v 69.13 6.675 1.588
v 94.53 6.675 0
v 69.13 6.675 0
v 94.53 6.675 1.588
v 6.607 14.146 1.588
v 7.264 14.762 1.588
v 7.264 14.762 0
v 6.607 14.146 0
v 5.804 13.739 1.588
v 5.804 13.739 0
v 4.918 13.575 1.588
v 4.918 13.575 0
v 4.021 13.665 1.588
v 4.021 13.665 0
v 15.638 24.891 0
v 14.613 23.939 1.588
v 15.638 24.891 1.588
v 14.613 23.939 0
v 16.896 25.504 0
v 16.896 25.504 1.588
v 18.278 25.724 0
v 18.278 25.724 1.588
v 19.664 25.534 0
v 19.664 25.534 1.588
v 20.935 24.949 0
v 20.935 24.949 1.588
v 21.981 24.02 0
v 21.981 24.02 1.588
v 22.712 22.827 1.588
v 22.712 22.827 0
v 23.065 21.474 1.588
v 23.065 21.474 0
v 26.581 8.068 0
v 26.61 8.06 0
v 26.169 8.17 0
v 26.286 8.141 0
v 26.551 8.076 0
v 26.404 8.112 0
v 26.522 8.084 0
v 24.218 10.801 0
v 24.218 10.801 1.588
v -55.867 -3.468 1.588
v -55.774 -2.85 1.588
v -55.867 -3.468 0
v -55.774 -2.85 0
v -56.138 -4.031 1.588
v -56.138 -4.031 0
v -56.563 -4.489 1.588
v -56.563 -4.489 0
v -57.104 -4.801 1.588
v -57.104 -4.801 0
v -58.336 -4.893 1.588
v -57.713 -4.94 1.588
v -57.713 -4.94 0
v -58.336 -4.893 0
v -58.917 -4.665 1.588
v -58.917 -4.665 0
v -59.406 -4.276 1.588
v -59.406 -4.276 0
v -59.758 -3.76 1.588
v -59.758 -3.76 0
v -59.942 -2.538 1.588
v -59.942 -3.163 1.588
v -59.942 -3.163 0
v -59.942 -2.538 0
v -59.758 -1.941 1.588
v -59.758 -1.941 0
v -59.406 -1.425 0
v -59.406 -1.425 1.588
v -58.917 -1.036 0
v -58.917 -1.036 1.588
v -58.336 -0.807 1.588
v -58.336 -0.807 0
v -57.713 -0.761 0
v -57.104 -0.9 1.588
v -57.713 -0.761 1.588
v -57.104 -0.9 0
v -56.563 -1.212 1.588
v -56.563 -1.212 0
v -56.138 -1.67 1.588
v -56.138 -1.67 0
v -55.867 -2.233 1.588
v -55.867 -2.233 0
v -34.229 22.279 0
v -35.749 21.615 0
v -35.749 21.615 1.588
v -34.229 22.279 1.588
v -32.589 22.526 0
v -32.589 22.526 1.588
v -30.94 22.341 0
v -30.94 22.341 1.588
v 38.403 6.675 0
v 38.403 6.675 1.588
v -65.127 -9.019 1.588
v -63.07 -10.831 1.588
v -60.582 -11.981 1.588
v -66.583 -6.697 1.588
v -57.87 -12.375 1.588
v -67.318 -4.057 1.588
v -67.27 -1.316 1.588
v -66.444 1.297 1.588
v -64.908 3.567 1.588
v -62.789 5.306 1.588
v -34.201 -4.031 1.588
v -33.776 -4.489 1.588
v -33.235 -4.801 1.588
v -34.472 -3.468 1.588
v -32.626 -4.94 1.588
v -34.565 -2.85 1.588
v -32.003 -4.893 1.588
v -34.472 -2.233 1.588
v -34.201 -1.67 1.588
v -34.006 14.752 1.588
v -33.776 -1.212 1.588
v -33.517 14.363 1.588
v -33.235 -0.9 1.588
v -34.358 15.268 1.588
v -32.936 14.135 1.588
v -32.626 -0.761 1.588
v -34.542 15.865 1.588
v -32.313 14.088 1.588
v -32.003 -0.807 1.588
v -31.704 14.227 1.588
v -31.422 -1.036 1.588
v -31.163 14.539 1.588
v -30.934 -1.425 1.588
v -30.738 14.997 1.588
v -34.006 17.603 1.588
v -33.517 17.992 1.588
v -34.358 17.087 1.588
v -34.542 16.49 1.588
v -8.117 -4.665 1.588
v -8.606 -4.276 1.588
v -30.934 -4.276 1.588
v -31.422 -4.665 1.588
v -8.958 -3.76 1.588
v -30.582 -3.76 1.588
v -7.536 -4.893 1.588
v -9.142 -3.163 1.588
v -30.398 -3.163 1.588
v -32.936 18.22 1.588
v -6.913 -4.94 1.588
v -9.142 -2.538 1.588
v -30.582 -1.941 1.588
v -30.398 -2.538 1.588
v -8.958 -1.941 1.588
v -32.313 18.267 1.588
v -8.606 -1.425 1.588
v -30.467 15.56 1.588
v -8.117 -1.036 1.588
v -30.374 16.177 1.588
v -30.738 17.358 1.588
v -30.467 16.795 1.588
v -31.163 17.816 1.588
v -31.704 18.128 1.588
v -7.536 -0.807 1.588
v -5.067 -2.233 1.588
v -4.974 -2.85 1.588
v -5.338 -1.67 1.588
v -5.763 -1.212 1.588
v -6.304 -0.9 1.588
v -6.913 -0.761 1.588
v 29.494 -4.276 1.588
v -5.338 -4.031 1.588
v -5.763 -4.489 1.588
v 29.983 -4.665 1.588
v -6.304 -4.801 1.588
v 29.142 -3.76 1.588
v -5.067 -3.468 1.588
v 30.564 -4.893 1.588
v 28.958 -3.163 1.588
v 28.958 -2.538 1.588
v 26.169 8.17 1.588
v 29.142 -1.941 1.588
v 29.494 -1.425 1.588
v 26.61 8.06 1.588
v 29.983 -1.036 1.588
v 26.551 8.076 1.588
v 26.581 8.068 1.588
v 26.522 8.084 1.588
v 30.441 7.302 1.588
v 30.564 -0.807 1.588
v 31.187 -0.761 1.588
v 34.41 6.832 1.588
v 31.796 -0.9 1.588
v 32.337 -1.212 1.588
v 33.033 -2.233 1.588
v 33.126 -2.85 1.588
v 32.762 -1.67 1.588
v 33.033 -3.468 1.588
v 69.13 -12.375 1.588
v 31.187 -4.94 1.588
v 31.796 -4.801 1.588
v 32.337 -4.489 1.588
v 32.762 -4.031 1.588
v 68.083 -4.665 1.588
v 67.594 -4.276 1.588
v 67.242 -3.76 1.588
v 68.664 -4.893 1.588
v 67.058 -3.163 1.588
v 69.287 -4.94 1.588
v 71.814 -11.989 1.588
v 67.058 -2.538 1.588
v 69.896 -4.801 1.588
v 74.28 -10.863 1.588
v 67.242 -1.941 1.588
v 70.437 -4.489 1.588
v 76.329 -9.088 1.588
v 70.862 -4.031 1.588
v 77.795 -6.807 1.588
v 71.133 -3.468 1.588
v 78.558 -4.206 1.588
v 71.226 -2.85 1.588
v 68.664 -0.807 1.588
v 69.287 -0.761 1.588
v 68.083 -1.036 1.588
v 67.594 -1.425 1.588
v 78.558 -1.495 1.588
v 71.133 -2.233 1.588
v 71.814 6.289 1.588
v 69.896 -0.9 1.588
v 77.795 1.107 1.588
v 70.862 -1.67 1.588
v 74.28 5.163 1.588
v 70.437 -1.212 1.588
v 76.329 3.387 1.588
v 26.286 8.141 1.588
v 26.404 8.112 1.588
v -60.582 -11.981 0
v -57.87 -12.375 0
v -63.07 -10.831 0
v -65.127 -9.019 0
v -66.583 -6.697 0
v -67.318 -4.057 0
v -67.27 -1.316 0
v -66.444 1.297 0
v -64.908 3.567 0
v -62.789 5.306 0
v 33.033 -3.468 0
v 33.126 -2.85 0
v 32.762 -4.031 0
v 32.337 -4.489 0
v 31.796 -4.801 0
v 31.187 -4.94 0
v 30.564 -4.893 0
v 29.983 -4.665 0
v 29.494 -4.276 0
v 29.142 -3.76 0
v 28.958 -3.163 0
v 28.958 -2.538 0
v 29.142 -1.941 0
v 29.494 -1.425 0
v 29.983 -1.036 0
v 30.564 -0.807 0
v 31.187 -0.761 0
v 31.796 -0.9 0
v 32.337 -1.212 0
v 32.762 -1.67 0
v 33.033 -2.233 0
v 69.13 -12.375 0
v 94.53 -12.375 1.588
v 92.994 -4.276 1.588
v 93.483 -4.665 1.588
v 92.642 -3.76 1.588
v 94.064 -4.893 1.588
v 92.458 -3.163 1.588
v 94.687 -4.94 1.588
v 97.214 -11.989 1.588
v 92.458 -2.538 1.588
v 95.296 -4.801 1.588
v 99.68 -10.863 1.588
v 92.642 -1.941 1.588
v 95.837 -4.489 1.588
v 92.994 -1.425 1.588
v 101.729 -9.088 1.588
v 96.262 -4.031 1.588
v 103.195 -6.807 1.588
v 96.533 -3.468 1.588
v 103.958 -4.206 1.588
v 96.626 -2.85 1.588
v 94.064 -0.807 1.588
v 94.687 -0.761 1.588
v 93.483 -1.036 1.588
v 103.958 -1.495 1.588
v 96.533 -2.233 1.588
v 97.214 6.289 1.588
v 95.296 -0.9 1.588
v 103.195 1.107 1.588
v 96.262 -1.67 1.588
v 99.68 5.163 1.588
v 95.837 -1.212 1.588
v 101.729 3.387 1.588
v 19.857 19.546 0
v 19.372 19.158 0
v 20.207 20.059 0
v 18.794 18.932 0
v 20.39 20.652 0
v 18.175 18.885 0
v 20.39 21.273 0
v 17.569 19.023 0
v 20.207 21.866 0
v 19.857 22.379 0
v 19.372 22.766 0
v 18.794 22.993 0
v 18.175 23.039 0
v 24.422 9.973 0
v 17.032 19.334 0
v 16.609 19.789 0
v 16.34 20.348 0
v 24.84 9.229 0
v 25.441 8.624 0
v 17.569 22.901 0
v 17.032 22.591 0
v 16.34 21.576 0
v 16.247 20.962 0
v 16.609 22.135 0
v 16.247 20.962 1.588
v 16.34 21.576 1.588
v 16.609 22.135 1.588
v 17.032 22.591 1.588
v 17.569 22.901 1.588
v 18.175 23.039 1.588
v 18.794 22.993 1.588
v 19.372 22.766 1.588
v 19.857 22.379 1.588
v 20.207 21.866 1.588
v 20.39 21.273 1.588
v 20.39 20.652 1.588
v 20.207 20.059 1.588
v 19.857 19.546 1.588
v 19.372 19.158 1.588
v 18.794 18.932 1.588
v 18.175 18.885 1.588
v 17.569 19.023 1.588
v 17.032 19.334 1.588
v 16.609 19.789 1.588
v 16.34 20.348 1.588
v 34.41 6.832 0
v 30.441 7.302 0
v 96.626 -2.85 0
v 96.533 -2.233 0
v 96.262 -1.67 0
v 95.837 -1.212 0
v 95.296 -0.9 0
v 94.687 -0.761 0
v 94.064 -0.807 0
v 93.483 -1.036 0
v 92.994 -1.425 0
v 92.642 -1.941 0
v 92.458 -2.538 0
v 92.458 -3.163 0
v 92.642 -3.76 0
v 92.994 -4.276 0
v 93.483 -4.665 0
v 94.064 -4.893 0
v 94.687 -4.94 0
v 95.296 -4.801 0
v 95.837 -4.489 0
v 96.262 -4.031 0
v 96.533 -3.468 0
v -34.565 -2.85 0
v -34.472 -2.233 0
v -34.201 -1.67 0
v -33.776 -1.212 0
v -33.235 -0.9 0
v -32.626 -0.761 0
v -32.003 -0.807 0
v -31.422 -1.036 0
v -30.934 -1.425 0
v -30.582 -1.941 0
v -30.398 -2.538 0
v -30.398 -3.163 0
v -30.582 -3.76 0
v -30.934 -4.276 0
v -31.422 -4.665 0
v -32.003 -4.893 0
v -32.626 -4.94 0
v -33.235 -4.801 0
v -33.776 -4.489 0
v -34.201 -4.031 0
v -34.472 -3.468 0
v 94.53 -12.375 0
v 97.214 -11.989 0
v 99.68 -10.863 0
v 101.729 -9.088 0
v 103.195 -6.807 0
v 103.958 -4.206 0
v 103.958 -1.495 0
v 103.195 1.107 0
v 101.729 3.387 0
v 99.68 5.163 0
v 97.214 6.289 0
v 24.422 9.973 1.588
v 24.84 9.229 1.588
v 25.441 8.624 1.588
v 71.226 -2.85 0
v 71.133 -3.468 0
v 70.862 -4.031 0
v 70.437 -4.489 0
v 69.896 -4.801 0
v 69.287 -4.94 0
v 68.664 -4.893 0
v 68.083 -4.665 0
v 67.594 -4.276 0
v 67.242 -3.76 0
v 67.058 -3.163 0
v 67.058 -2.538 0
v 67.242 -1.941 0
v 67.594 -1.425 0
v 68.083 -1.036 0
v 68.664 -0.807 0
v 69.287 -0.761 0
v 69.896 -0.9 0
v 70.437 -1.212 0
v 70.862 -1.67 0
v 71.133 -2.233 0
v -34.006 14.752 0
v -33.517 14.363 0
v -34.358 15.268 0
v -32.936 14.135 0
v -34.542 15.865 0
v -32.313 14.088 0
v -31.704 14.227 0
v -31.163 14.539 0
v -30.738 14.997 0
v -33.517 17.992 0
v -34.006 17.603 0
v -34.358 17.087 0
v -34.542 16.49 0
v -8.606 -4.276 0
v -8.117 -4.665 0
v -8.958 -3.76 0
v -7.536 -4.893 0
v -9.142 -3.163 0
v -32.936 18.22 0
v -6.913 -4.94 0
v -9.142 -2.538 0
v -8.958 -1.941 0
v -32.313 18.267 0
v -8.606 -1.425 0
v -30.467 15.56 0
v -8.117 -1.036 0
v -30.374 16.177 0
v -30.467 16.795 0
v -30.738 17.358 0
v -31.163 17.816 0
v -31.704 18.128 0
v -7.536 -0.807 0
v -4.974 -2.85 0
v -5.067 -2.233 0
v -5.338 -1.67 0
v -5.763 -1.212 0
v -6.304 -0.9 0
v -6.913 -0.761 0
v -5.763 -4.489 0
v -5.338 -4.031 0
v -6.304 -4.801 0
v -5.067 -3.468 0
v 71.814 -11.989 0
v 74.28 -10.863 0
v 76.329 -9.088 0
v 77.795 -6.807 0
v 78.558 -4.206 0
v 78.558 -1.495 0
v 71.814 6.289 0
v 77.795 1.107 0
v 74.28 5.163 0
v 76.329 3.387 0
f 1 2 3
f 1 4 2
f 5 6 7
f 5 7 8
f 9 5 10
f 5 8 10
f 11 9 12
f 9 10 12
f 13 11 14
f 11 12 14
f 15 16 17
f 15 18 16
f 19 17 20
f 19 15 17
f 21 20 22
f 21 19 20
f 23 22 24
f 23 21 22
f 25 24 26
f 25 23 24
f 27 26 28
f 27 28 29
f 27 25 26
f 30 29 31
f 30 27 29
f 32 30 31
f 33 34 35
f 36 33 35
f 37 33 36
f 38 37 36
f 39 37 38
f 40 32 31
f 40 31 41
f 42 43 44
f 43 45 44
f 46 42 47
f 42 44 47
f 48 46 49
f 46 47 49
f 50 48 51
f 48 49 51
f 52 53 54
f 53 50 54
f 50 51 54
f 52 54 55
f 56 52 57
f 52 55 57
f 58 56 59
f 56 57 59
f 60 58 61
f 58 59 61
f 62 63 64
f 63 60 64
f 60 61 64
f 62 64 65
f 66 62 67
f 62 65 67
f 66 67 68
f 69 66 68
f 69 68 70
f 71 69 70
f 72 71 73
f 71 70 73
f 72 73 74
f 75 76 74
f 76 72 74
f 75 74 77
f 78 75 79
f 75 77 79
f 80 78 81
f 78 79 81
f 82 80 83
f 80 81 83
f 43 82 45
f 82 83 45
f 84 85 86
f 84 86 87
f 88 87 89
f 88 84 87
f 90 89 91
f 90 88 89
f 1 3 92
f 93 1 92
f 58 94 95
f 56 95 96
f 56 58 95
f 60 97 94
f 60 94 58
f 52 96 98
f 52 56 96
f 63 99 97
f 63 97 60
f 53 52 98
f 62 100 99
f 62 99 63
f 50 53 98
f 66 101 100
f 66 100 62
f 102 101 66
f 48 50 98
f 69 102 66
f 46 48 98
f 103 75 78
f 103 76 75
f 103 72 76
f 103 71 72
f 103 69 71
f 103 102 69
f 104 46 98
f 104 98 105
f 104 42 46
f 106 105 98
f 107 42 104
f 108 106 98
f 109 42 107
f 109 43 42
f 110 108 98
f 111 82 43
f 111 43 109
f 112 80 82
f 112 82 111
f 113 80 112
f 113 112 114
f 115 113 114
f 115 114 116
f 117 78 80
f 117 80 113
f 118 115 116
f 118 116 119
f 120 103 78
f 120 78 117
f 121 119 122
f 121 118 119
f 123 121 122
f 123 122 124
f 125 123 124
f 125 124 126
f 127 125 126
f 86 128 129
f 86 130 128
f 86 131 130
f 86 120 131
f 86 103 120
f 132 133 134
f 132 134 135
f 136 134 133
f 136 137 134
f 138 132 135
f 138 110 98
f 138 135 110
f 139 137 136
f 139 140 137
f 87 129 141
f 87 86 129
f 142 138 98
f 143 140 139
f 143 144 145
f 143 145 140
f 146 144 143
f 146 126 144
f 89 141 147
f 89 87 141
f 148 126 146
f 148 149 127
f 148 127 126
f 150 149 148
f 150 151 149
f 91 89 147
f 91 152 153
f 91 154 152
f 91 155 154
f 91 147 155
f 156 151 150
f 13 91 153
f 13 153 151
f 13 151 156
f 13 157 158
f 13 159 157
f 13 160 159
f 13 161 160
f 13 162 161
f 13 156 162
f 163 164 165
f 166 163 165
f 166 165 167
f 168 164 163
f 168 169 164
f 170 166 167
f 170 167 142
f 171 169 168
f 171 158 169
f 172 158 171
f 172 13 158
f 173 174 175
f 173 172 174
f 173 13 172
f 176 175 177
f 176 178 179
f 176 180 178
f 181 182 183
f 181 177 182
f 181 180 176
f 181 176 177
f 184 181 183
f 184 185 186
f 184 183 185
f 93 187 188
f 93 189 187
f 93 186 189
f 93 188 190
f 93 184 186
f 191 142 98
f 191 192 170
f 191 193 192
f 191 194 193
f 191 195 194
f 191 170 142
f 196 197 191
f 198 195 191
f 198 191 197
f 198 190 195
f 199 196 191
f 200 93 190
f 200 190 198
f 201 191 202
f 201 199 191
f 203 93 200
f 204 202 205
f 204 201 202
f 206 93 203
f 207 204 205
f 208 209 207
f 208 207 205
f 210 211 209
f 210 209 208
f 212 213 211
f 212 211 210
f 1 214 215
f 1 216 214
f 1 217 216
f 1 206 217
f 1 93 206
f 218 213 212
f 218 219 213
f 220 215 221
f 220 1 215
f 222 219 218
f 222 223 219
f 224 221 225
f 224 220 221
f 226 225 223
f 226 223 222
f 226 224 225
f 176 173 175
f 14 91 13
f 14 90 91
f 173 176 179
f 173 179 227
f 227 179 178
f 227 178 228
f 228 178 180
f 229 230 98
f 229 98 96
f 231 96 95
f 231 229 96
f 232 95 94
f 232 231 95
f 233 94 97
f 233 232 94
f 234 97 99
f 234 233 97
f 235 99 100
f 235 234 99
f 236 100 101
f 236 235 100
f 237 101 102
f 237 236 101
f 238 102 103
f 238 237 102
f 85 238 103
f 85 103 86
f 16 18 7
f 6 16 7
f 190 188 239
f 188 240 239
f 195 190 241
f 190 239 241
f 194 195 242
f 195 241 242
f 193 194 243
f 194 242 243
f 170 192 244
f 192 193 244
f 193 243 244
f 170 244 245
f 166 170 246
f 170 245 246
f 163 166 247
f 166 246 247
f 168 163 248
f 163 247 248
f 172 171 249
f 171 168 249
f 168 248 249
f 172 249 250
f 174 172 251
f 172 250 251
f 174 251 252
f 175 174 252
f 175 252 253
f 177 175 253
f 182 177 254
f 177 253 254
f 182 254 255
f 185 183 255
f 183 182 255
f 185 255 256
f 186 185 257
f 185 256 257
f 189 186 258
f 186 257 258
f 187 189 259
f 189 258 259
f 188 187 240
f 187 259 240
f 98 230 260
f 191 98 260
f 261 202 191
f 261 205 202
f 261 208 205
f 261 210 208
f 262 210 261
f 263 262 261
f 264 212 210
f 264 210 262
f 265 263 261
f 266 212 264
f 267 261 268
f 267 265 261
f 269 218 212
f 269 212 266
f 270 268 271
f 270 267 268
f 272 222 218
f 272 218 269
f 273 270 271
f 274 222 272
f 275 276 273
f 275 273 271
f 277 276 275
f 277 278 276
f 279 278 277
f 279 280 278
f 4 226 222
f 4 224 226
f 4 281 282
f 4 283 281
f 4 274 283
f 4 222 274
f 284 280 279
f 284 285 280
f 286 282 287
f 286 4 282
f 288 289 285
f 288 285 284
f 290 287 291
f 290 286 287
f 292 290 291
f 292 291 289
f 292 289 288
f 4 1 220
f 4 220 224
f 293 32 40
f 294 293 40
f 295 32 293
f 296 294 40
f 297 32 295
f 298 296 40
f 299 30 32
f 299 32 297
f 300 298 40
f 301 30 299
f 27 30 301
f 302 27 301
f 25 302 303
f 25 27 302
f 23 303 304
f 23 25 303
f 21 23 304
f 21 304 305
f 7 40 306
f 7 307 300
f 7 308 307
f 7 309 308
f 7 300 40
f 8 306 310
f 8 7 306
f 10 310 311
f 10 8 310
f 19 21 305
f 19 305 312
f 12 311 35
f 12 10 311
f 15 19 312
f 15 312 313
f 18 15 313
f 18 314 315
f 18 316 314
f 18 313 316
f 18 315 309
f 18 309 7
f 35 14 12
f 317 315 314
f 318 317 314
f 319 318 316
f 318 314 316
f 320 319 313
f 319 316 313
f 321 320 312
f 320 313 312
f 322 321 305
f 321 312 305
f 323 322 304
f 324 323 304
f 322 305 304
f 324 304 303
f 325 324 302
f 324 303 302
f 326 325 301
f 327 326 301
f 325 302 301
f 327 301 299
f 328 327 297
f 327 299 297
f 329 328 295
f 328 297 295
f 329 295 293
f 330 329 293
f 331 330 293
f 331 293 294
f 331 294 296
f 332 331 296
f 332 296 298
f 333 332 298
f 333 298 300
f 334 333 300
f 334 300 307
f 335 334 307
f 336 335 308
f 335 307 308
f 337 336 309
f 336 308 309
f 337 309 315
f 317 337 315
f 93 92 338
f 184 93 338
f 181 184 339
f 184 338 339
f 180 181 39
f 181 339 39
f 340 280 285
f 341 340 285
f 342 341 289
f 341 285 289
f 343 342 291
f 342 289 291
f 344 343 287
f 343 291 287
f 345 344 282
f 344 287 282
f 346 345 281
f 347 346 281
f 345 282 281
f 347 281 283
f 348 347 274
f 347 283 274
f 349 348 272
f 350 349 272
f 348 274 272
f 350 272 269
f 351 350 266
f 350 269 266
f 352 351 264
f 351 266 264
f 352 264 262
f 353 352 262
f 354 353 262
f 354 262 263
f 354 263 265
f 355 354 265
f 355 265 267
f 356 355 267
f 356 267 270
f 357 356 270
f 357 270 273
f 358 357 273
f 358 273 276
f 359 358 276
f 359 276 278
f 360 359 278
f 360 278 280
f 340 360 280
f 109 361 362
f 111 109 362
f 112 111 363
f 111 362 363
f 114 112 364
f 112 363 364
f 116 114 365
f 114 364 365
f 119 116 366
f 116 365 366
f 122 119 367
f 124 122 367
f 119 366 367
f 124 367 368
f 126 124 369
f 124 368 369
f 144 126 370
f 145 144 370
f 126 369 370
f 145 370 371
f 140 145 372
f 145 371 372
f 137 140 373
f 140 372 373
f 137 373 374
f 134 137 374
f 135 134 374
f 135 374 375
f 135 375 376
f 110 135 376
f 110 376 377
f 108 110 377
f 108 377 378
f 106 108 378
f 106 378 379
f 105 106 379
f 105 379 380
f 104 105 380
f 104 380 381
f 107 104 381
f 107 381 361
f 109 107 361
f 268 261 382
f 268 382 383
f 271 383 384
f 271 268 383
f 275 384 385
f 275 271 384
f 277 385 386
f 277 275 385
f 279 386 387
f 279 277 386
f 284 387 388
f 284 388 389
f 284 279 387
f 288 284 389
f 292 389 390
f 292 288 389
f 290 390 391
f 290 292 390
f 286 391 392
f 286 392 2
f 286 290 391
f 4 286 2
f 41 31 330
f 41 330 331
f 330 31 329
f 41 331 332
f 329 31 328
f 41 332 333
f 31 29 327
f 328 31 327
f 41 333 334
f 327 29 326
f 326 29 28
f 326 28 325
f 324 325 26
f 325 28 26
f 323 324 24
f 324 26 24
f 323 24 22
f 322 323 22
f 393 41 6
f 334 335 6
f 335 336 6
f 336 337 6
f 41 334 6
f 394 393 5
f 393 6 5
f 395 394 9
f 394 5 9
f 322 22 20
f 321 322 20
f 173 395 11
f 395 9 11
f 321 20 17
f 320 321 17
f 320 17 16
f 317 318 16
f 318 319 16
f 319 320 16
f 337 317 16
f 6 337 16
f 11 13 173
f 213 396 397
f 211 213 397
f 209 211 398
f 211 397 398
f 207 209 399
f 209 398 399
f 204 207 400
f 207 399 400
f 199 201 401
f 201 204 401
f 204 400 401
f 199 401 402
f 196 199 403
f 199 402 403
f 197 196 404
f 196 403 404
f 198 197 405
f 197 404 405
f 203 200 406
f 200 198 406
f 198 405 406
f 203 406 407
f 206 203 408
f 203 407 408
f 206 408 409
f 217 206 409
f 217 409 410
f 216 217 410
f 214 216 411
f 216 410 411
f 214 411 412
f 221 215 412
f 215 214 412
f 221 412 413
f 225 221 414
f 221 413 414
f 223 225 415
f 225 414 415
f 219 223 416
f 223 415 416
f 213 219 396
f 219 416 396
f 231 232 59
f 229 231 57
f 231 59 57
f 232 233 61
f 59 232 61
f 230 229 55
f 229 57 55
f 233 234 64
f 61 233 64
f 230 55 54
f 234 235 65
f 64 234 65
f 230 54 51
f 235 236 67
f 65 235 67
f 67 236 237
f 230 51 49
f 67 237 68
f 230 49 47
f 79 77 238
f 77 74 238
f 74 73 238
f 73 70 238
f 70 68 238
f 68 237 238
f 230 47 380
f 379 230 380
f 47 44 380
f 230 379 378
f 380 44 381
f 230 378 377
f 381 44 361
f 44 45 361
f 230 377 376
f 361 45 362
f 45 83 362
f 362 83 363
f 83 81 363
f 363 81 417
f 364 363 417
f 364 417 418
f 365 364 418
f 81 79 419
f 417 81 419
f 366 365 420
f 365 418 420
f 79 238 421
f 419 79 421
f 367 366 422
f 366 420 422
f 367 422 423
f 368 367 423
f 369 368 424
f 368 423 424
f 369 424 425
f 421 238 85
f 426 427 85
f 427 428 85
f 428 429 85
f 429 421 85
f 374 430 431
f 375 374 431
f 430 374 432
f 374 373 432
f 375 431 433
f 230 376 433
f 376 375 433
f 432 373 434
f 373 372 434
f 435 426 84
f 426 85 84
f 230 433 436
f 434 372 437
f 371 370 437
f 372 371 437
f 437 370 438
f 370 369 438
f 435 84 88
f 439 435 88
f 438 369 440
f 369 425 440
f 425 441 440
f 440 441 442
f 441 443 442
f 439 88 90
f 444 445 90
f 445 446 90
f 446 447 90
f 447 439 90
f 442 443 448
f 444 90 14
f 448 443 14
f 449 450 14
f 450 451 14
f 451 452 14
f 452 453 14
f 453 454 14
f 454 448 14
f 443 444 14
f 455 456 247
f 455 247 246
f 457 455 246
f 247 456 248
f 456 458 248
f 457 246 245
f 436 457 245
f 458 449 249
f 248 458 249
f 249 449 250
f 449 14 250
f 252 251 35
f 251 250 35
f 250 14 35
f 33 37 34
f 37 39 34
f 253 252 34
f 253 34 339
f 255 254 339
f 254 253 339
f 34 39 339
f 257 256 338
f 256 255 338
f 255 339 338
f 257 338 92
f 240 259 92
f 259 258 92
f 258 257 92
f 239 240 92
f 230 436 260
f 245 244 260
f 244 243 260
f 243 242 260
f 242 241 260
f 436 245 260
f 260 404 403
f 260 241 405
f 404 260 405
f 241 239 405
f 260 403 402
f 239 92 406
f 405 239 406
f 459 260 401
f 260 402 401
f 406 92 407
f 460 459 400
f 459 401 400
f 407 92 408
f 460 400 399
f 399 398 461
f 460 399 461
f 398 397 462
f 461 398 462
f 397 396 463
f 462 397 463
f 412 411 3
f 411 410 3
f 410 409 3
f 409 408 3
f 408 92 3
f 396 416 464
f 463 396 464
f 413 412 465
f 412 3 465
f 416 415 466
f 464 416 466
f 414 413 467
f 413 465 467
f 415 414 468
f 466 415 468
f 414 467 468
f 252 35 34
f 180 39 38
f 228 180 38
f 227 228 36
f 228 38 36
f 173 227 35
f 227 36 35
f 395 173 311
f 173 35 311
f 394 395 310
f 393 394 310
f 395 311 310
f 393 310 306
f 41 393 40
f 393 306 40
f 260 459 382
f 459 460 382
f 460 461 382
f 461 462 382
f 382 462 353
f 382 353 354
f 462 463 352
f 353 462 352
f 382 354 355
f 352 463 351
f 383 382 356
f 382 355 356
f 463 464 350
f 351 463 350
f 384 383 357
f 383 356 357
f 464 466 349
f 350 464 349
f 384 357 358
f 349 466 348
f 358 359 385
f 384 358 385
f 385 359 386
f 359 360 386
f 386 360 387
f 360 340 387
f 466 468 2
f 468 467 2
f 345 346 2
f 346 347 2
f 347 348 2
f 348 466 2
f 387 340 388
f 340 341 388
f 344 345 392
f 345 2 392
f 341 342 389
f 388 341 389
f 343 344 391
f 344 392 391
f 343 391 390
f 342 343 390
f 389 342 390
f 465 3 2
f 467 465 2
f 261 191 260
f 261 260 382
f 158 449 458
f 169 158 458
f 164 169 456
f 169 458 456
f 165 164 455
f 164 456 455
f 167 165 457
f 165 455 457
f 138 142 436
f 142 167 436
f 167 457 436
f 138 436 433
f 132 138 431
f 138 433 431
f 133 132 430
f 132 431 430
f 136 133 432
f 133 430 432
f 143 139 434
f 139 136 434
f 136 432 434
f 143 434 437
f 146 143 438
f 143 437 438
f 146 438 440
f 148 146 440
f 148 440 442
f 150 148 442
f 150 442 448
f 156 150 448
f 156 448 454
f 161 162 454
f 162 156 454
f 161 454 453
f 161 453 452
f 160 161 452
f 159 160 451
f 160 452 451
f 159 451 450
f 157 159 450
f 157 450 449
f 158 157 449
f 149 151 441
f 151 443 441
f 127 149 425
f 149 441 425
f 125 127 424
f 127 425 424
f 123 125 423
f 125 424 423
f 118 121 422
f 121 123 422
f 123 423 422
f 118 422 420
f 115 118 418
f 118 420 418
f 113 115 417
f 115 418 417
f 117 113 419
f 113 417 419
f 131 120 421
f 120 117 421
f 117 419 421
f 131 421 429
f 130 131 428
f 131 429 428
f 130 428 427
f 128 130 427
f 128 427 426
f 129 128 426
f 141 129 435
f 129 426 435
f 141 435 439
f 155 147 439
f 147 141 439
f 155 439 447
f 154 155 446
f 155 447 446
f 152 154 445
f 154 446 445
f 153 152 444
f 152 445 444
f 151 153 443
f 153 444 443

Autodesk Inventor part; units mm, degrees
ref_plane "YZ Plane" through (0, 0, 0) normal (1, 0, 0) x (0, 1, 0)
ref_plane "XZ Plane" through (0, 0, 0) normal (0, 1, 0) x (-1, 0, 0)
ref_plane "XY Plane" through (0, 0, 0) normal (0, 0, 1) x (1, 0, 0)
sketch "Sketch1" plane through (0, 0, 0) normal (0, 0, 1) x (1, 0, 0)
  circle A0 centre (-57.8697, -2.8503) radius 2.0955
  circle A1 centre (-7.0697, -2.8503) radius 2.0955
  circle A2 centre (31.0303, -2.8503) radius 2.0955
  circle A3 centre (69.1303, -2.8503) radius 2.0955
  arc A4 (-62.7892, 5.306) -> (-57.8697, -12.3753) centre (-57.8697, -2.8503) ccw
  arc A5 (-30.9405, 22.3406) -> (-35.7494, 21.615) centre (-32.4697, 16.1775) ccw
  arc A6 (69.1303, -12.3753) -> (69.1303, 6.6747) centre (69.1303, -2.8503) ccw
  line L0 (-57.8697, -12.3753) -> (69.1303, -12.3753)
  line L1 (-62.7892, 5.306) -> (-35.1787, 21.9592)
  line L2 (69.1303, 6.6747) -> (38.4028, 6.6747)
  line L3 (-30.9405, 22.3406) -> (26.1686, 8.1699)
  arc A7 (26.1686, 8.1699) -> (38.4028, 6.6747) centre (38.4028, 57.4747) ccw
  circle A8 centre (-32.4697, 16.1775) radius 2.0955
  point P0 (0, 0)
  dimension "d0" = 4.191
  dimension "d1" = 4.191
  dimension "d2" = 4.191
  dimension "d3" = 4.191
  dimension "d4" = 50.8
  dimension "d5" = 4.191
extrude "Extrusion1" add sketch "Sketch1" along normal blind 1.5875
sketch "Sketch2" plane through (-7.0697, -2.8503, 0) normal (0, 0, -1) x (-1, 0, 0)
  circle A0 centre (25.4, 0) radius 2.0955
  point P0 (-7.0697, 2.8503)
  dimension "d8" = 4.191
extrude "Extrusion2" cut sketch "Sketch2" against normal blind 1.5875
sketch "Sketch3" plane through (-7.0697, -2.8503, 0) normal (0, 0, -1) x (-1, 0, 0)
  line L0 (-21.6825, 26.7893) -> (-14.3342, 17.6126)
  line L1 (-30.135, 24.3239) -> (-31.2875, 13.6514)
  line L2 (-33.2384, 11.0202) -> (23.8707, 25.1909) projected
  line L3 (-33.6796, 10.9107) -> (-33.2384, 11.0202)
  arc A0 (-33.6796, 10.9107) -> (-31.2875, 13.6514) centre (-34.4442, 13.9923) ccw
  line L4 (23.8707, 25.1909) -> (-11.0912, 16.5156)
  arc A1 (-14.3342, 17.6126) -> (-11.0912, 16.5156) centre (-11.8558, 19.5972) ccw
  circle A2 centre (-25.4, 23.8125) radius 2.0828
  arc A3 (-21.6825, 26.7893) -> (-30.135, 24.3239) centre (-25.4, 23.8125) ccw
  point P0 (-7.0697, 2.8503)
  point P1 (-13.3897, 15.9453)
  point P2 (-13.0638, 16.0262)
  dimension "d19" = 3.175
  dimension "d20" = 3.175
  dimension "d21" = 4.1656
extrude "Extrusion3" add sketch "Sketch3" against normal blind 1.5875
sketch "Sketch5" plane through (69.1303, -2.8503, 1.5875) normal (0, 0, 1) x (1, 0, 0)
  circle A0 centre (25.4, 0) radius 2.0955
  arc A1 (25.4, -9.525) -> (25.4, 9.525) centre (25.4, 0) ccw
  line L0 (25.4, 9.525) -> (0, 9.525)
  arc A2 (0, -9.525) -> (0, 9.525) centre (0, 0) ccw projected
  line L1 (0, -9.525) -> (25.4, -9.525)
  point P0 (-69.1303, 2.8503)
  dimension "d26" = 4.191
extrude "Extrusion5" add sketch "Sketch5" against normal blind 1.5875
properties part number "intake_gusset" material "Acetal Resin, White"
